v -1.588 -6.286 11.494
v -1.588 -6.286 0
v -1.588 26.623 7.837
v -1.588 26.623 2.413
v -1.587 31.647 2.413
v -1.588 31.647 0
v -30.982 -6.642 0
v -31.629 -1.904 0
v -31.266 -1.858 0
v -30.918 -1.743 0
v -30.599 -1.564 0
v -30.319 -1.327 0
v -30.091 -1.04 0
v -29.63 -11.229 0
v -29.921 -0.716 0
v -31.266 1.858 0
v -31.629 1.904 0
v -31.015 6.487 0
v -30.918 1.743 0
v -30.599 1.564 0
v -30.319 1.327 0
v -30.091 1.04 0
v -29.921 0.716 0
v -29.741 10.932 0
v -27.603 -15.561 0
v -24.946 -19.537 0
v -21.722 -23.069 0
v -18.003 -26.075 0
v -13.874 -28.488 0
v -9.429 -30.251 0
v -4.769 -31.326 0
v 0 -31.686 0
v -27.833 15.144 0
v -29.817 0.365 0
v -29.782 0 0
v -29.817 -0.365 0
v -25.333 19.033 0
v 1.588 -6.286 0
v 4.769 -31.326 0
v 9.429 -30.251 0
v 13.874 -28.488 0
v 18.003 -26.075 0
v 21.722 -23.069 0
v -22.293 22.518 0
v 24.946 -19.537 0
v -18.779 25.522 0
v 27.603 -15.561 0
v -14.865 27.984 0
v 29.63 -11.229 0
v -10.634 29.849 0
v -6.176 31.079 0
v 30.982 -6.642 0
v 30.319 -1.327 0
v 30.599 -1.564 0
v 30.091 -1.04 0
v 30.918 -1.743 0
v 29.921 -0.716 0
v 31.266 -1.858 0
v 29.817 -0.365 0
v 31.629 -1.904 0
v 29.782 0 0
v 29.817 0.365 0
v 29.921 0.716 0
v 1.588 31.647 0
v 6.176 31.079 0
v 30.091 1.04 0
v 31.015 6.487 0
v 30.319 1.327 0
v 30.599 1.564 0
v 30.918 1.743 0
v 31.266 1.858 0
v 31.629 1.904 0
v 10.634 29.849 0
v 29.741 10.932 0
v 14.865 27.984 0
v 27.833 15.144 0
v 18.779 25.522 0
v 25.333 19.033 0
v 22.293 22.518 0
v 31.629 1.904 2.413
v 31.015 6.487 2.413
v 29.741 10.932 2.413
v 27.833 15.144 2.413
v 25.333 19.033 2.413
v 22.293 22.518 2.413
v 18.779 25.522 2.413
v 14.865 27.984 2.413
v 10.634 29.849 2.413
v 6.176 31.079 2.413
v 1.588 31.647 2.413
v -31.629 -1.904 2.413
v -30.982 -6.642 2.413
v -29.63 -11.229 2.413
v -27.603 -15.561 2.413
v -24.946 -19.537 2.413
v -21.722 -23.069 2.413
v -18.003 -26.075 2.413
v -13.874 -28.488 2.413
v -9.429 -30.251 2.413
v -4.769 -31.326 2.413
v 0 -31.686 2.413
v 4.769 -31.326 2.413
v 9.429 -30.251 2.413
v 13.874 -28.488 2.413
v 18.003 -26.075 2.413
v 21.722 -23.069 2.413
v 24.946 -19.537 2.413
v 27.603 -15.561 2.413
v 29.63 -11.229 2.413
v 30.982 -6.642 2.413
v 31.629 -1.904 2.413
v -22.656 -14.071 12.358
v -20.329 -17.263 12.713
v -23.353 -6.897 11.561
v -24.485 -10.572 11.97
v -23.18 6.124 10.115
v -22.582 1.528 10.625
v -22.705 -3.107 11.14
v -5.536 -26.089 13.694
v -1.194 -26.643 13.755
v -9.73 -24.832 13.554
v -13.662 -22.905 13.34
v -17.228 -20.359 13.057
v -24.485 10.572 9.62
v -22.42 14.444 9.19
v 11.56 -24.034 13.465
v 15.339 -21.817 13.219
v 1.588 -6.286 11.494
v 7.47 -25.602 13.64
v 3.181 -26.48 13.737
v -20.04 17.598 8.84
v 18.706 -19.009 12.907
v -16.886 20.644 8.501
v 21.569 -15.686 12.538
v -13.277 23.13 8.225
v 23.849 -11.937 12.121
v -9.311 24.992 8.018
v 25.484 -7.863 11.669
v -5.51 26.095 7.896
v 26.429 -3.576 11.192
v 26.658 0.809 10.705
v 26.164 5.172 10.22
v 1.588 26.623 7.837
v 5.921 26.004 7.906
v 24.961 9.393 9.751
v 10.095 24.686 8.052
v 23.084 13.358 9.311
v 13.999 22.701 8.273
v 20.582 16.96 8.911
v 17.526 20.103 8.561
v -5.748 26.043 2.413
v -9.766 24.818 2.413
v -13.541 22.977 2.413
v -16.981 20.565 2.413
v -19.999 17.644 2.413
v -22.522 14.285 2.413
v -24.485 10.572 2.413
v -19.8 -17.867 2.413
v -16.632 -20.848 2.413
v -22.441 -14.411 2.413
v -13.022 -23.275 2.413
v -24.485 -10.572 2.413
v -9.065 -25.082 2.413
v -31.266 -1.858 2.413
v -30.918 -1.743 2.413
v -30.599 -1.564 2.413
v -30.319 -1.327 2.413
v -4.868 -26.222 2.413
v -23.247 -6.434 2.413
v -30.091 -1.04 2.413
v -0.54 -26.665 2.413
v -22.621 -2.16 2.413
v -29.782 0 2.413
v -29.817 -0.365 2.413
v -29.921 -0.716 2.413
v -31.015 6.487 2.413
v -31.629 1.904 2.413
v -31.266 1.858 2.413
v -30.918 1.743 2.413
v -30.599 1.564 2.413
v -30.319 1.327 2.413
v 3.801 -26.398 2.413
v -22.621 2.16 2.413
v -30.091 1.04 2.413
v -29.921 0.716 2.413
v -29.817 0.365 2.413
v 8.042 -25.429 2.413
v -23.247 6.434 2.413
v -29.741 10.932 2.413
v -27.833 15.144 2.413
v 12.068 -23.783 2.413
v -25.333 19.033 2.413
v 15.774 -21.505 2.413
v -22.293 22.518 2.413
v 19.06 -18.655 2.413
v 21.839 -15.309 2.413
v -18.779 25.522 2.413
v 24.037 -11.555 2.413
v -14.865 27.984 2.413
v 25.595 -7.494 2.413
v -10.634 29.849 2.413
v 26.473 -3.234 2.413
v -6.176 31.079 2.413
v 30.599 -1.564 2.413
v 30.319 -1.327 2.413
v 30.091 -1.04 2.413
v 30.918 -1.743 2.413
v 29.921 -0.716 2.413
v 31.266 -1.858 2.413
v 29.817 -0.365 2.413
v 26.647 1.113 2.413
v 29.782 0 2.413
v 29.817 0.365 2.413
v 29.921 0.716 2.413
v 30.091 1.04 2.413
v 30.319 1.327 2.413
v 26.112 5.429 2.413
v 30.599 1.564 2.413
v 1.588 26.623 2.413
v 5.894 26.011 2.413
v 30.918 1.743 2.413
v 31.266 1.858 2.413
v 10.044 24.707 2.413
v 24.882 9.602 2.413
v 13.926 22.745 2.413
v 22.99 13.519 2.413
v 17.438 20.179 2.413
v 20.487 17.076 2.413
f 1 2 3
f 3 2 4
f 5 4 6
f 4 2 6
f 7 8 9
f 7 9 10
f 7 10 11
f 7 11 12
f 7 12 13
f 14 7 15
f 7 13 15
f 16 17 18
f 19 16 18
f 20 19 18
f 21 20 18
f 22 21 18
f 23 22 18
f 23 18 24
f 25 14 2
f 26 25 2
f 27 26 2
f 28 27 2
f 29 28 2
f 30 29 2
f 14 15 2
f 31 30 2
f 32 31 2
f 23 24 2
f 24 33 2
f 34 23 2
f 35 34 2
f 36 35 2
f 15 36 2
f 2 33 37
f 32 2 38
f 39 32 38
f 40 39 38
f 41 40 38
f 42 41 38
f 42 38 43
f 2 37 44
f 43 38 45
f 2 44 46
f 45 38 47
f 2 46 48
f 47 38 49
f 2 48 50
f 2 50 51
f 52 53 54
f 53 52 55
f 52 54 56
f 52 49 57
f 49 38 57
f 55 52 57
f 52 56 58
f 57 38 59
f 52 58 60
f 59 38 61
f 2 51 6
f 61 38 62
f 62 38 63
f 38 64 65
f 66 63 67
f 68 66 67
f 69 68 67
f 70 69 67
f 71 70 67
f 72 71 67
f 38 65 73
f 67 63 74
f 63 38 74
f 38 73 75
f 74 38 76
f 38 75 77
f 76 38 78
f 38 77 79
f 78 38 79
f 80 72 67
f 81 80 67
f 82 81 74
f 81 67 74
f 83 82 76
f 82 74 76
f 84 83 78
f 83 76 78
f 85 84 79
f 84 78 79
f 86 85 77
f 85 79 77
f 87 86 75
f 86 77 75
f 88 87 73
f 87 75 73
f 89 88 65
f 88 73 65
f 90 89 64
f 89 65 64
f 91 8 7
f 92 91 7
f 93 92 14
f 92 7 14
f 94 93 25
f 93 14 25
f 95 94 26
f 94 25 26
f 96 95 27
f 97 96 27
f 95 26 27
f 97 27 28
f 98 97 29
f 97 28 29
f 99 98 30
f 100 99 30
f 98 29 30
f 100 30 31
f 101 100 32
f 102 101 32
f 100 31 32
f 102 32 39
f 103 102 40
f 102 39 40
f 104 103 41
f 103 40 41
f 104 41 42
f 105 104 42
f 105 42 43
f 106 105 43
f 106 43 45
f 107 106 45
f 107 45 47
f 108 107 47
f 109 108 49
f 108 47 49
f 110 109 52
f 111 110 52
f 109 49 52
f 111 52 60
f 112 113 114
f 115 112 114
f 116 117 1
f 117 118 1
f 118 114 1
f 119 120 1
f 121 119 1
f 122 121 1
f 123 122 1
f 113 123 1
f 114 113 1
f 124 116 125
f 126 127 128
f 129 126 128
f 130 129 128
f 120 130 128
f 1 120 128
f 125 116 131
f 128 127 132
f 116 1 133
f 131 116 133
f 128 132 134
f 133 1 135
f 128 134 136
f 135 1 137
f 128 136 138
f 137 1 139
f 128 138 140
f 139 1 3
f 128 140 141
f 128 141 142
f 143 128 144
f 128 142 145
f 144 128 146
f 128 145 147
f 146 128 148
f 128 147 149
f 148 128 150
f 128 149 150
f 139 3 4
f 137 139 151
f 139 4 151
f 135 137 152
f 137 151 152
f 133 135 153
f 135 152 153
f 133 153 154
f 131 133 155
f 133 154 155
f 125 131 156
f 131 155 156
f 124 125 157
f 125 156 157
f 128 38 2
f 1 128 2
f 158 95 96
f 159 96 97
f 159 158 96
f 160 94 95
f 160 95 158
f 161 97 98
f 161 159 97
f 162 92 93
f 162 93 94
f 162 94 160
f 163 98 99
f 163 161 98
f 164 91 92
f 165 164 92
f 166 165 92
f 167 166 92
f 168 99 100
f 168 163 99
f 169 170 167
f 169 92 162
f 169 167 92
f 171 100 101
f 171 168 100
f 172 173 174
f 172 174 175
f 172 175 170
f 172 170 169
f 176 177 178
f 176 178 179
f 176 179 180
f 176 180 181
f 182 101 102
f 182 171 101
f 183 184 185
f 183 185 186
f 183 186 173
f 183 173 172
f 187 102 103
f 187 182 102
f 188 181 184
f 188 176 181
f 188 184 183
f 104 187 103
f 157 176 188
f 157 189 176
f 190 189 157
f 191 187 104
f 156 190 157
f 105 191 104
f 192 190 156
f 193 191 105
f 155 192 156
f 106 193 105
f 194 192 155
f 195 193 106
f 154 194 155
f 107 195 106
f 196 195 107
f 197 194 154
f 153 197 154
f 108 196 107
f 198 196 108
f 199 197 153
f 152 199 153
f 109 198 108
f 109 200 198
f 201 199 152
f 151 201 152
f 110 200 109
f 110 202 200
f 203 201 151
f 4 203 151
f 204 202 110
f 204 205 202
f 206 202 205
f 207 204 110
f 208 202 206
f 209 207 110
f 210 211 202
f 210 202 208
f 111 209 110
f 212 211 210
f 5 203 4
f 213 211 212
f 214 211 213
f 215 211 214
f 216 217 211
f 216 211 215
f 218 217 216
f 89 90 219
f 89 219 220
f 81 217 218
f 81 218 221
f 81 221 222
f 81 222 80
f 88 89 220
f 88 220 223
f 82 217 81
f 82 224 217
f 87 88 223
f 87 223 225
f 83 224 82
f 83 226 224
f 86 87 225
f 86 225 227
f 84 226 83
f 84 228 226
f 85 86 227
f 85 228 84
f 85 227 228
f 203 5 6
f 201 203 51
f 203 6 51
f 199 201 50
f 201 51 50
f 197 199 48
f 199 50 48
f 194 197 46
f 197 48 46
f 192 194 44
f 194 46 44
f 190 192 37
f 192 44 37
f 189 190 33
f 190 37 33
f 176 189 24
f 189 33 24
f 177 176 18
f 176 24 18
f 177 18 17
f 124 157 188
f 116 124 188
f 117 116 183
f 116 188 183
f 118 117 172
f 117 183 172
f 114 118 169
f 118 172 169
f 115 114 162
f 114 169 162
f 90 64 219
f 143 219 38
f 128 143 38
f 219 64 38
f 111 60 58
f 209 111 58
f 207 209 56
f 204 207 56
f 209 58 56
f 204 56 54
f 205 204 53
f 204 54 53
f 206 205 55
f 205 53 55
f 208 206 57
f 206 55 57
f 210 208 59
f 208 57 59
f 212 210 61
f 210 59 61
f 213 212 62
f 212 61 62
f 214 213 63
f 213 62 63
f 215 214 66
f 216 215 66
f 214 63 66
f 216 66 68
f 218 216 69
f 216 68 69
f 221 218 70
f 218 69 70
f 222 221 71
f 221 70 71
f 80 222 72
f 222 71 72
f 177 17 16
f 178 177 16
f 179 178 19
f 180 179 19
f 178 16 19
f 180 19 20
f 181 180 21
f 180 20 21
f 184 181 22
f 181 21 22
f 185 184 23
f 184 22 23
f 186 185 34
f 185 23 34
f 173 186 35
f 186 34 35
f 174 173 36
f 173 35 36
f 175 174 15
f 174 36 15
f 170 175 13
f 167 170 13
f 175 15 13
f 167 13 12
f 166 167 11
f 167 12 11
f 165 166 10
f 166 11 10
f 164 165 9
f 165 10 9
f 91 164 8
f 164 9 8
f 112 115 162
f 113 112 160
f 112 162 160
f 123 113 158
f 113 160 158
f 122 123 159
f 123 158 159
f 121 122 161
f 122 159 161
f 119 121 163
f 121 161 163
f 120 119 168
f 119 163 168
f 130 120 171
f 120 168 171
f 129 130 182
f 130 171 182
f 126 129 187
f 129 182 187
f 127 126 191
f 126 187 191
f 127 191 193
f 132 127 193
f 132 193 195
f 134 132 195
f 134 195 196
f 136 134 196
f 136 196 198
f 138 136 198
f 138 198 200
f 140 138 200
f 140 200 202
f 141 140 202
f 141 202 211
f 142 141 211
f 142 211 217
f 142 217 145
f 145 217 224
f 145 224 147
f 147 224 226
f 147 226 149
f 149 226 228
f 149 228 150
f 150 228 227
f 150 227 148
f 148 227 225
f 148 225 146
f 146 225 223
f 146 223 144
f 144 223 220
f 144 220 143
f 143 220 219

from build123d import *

# Parameters (mm, degrees)
F1_DEPTH = 2.413
F3_DEPTH = 25.4
F5_DEPTH = 31.75
F7_DEPTH = 25.4


with BuildPart() as f1:
    # F0 (on Top) → F1 (new body)
    with BuildSketch(Plane.XY):
        with BuildLine():
            ThreePointArc((31.629235, -1.904139), (29.7815, 0), (31.629235, 1.904139))
            ThreePointArc((31.629235, 1.904139), (0, 31.6865), (-31.629235, 1.904139))
            ThreePointArc((-31.629235, 1.904139), (-29.7815, 0), (-31.629235, -1.904139))
            ThreePointArc((-31.629235, -1.904139), (0, -31.6865), (31.629235, -1.904139))
        make_face()
    extrude(amount=F1_DEPTH)

    # F2 (on face) → F3 (join)
    with BuildSketch(Plane.XY.offset(2.413)):
        with BuildLine():
            ThreePointArc((-24.485298, 10.571618), (-22.5425, 0), (-24.485298, -10.571618))
            ThreePointArc((-24.485298, -10.571618), (26.67, 0), (-24.485298, 10.571618))
        make_face()
    extrude(amount=F3_DEPTH)

    # F4 (on Right) → F5 (cut, symmetric)
    with BuildSketch(Plane.YZ):
        Polygon((-28.575, 36.80041), (-28.575, 13.97), (28.575, 7.62), (28.575, 36.80041), align=None)
    extrude(amount=F5_DEPTH, both=True, mode=Mode.SUBTRACT)

    # F6 (on face) → F7 (cut)
    with BuildSketch(Plane(origin=(0, 0, 0), x_dir=(1, 0, 0), z_dir=(0, 0, -1))):
        with BuildLine():
            Line((-1.5875, 6.2865), (-1.5875, -31.646708))
            ThreePointArc((-1.5875, -31.646708), (0, -31.6865), (1.5875, -31.646708))
            Line((1.5875, -31.646708), (1.5875, 6.2865))
            Line((1.5875, 6.2865), (-1.5875, 6.2865))
        make_face()
        with BuildLine():
            Line((-1.5875, -31.646708), (-1.5875, -44.5135))
            Line((-1.5875, -44.5135), (1.5875, -44.5135))
            Line((1.5875, -44.5135), (1.5875, -31.646708))
            ThreePointArc((1.5875, -31.646708), (0, -31.6865), (-1.5875, -31.646708))
        make_face()
    extrude(amount=-F7_DEPTH, mode=Mode.SUBTRACT)


solid = f1.part
